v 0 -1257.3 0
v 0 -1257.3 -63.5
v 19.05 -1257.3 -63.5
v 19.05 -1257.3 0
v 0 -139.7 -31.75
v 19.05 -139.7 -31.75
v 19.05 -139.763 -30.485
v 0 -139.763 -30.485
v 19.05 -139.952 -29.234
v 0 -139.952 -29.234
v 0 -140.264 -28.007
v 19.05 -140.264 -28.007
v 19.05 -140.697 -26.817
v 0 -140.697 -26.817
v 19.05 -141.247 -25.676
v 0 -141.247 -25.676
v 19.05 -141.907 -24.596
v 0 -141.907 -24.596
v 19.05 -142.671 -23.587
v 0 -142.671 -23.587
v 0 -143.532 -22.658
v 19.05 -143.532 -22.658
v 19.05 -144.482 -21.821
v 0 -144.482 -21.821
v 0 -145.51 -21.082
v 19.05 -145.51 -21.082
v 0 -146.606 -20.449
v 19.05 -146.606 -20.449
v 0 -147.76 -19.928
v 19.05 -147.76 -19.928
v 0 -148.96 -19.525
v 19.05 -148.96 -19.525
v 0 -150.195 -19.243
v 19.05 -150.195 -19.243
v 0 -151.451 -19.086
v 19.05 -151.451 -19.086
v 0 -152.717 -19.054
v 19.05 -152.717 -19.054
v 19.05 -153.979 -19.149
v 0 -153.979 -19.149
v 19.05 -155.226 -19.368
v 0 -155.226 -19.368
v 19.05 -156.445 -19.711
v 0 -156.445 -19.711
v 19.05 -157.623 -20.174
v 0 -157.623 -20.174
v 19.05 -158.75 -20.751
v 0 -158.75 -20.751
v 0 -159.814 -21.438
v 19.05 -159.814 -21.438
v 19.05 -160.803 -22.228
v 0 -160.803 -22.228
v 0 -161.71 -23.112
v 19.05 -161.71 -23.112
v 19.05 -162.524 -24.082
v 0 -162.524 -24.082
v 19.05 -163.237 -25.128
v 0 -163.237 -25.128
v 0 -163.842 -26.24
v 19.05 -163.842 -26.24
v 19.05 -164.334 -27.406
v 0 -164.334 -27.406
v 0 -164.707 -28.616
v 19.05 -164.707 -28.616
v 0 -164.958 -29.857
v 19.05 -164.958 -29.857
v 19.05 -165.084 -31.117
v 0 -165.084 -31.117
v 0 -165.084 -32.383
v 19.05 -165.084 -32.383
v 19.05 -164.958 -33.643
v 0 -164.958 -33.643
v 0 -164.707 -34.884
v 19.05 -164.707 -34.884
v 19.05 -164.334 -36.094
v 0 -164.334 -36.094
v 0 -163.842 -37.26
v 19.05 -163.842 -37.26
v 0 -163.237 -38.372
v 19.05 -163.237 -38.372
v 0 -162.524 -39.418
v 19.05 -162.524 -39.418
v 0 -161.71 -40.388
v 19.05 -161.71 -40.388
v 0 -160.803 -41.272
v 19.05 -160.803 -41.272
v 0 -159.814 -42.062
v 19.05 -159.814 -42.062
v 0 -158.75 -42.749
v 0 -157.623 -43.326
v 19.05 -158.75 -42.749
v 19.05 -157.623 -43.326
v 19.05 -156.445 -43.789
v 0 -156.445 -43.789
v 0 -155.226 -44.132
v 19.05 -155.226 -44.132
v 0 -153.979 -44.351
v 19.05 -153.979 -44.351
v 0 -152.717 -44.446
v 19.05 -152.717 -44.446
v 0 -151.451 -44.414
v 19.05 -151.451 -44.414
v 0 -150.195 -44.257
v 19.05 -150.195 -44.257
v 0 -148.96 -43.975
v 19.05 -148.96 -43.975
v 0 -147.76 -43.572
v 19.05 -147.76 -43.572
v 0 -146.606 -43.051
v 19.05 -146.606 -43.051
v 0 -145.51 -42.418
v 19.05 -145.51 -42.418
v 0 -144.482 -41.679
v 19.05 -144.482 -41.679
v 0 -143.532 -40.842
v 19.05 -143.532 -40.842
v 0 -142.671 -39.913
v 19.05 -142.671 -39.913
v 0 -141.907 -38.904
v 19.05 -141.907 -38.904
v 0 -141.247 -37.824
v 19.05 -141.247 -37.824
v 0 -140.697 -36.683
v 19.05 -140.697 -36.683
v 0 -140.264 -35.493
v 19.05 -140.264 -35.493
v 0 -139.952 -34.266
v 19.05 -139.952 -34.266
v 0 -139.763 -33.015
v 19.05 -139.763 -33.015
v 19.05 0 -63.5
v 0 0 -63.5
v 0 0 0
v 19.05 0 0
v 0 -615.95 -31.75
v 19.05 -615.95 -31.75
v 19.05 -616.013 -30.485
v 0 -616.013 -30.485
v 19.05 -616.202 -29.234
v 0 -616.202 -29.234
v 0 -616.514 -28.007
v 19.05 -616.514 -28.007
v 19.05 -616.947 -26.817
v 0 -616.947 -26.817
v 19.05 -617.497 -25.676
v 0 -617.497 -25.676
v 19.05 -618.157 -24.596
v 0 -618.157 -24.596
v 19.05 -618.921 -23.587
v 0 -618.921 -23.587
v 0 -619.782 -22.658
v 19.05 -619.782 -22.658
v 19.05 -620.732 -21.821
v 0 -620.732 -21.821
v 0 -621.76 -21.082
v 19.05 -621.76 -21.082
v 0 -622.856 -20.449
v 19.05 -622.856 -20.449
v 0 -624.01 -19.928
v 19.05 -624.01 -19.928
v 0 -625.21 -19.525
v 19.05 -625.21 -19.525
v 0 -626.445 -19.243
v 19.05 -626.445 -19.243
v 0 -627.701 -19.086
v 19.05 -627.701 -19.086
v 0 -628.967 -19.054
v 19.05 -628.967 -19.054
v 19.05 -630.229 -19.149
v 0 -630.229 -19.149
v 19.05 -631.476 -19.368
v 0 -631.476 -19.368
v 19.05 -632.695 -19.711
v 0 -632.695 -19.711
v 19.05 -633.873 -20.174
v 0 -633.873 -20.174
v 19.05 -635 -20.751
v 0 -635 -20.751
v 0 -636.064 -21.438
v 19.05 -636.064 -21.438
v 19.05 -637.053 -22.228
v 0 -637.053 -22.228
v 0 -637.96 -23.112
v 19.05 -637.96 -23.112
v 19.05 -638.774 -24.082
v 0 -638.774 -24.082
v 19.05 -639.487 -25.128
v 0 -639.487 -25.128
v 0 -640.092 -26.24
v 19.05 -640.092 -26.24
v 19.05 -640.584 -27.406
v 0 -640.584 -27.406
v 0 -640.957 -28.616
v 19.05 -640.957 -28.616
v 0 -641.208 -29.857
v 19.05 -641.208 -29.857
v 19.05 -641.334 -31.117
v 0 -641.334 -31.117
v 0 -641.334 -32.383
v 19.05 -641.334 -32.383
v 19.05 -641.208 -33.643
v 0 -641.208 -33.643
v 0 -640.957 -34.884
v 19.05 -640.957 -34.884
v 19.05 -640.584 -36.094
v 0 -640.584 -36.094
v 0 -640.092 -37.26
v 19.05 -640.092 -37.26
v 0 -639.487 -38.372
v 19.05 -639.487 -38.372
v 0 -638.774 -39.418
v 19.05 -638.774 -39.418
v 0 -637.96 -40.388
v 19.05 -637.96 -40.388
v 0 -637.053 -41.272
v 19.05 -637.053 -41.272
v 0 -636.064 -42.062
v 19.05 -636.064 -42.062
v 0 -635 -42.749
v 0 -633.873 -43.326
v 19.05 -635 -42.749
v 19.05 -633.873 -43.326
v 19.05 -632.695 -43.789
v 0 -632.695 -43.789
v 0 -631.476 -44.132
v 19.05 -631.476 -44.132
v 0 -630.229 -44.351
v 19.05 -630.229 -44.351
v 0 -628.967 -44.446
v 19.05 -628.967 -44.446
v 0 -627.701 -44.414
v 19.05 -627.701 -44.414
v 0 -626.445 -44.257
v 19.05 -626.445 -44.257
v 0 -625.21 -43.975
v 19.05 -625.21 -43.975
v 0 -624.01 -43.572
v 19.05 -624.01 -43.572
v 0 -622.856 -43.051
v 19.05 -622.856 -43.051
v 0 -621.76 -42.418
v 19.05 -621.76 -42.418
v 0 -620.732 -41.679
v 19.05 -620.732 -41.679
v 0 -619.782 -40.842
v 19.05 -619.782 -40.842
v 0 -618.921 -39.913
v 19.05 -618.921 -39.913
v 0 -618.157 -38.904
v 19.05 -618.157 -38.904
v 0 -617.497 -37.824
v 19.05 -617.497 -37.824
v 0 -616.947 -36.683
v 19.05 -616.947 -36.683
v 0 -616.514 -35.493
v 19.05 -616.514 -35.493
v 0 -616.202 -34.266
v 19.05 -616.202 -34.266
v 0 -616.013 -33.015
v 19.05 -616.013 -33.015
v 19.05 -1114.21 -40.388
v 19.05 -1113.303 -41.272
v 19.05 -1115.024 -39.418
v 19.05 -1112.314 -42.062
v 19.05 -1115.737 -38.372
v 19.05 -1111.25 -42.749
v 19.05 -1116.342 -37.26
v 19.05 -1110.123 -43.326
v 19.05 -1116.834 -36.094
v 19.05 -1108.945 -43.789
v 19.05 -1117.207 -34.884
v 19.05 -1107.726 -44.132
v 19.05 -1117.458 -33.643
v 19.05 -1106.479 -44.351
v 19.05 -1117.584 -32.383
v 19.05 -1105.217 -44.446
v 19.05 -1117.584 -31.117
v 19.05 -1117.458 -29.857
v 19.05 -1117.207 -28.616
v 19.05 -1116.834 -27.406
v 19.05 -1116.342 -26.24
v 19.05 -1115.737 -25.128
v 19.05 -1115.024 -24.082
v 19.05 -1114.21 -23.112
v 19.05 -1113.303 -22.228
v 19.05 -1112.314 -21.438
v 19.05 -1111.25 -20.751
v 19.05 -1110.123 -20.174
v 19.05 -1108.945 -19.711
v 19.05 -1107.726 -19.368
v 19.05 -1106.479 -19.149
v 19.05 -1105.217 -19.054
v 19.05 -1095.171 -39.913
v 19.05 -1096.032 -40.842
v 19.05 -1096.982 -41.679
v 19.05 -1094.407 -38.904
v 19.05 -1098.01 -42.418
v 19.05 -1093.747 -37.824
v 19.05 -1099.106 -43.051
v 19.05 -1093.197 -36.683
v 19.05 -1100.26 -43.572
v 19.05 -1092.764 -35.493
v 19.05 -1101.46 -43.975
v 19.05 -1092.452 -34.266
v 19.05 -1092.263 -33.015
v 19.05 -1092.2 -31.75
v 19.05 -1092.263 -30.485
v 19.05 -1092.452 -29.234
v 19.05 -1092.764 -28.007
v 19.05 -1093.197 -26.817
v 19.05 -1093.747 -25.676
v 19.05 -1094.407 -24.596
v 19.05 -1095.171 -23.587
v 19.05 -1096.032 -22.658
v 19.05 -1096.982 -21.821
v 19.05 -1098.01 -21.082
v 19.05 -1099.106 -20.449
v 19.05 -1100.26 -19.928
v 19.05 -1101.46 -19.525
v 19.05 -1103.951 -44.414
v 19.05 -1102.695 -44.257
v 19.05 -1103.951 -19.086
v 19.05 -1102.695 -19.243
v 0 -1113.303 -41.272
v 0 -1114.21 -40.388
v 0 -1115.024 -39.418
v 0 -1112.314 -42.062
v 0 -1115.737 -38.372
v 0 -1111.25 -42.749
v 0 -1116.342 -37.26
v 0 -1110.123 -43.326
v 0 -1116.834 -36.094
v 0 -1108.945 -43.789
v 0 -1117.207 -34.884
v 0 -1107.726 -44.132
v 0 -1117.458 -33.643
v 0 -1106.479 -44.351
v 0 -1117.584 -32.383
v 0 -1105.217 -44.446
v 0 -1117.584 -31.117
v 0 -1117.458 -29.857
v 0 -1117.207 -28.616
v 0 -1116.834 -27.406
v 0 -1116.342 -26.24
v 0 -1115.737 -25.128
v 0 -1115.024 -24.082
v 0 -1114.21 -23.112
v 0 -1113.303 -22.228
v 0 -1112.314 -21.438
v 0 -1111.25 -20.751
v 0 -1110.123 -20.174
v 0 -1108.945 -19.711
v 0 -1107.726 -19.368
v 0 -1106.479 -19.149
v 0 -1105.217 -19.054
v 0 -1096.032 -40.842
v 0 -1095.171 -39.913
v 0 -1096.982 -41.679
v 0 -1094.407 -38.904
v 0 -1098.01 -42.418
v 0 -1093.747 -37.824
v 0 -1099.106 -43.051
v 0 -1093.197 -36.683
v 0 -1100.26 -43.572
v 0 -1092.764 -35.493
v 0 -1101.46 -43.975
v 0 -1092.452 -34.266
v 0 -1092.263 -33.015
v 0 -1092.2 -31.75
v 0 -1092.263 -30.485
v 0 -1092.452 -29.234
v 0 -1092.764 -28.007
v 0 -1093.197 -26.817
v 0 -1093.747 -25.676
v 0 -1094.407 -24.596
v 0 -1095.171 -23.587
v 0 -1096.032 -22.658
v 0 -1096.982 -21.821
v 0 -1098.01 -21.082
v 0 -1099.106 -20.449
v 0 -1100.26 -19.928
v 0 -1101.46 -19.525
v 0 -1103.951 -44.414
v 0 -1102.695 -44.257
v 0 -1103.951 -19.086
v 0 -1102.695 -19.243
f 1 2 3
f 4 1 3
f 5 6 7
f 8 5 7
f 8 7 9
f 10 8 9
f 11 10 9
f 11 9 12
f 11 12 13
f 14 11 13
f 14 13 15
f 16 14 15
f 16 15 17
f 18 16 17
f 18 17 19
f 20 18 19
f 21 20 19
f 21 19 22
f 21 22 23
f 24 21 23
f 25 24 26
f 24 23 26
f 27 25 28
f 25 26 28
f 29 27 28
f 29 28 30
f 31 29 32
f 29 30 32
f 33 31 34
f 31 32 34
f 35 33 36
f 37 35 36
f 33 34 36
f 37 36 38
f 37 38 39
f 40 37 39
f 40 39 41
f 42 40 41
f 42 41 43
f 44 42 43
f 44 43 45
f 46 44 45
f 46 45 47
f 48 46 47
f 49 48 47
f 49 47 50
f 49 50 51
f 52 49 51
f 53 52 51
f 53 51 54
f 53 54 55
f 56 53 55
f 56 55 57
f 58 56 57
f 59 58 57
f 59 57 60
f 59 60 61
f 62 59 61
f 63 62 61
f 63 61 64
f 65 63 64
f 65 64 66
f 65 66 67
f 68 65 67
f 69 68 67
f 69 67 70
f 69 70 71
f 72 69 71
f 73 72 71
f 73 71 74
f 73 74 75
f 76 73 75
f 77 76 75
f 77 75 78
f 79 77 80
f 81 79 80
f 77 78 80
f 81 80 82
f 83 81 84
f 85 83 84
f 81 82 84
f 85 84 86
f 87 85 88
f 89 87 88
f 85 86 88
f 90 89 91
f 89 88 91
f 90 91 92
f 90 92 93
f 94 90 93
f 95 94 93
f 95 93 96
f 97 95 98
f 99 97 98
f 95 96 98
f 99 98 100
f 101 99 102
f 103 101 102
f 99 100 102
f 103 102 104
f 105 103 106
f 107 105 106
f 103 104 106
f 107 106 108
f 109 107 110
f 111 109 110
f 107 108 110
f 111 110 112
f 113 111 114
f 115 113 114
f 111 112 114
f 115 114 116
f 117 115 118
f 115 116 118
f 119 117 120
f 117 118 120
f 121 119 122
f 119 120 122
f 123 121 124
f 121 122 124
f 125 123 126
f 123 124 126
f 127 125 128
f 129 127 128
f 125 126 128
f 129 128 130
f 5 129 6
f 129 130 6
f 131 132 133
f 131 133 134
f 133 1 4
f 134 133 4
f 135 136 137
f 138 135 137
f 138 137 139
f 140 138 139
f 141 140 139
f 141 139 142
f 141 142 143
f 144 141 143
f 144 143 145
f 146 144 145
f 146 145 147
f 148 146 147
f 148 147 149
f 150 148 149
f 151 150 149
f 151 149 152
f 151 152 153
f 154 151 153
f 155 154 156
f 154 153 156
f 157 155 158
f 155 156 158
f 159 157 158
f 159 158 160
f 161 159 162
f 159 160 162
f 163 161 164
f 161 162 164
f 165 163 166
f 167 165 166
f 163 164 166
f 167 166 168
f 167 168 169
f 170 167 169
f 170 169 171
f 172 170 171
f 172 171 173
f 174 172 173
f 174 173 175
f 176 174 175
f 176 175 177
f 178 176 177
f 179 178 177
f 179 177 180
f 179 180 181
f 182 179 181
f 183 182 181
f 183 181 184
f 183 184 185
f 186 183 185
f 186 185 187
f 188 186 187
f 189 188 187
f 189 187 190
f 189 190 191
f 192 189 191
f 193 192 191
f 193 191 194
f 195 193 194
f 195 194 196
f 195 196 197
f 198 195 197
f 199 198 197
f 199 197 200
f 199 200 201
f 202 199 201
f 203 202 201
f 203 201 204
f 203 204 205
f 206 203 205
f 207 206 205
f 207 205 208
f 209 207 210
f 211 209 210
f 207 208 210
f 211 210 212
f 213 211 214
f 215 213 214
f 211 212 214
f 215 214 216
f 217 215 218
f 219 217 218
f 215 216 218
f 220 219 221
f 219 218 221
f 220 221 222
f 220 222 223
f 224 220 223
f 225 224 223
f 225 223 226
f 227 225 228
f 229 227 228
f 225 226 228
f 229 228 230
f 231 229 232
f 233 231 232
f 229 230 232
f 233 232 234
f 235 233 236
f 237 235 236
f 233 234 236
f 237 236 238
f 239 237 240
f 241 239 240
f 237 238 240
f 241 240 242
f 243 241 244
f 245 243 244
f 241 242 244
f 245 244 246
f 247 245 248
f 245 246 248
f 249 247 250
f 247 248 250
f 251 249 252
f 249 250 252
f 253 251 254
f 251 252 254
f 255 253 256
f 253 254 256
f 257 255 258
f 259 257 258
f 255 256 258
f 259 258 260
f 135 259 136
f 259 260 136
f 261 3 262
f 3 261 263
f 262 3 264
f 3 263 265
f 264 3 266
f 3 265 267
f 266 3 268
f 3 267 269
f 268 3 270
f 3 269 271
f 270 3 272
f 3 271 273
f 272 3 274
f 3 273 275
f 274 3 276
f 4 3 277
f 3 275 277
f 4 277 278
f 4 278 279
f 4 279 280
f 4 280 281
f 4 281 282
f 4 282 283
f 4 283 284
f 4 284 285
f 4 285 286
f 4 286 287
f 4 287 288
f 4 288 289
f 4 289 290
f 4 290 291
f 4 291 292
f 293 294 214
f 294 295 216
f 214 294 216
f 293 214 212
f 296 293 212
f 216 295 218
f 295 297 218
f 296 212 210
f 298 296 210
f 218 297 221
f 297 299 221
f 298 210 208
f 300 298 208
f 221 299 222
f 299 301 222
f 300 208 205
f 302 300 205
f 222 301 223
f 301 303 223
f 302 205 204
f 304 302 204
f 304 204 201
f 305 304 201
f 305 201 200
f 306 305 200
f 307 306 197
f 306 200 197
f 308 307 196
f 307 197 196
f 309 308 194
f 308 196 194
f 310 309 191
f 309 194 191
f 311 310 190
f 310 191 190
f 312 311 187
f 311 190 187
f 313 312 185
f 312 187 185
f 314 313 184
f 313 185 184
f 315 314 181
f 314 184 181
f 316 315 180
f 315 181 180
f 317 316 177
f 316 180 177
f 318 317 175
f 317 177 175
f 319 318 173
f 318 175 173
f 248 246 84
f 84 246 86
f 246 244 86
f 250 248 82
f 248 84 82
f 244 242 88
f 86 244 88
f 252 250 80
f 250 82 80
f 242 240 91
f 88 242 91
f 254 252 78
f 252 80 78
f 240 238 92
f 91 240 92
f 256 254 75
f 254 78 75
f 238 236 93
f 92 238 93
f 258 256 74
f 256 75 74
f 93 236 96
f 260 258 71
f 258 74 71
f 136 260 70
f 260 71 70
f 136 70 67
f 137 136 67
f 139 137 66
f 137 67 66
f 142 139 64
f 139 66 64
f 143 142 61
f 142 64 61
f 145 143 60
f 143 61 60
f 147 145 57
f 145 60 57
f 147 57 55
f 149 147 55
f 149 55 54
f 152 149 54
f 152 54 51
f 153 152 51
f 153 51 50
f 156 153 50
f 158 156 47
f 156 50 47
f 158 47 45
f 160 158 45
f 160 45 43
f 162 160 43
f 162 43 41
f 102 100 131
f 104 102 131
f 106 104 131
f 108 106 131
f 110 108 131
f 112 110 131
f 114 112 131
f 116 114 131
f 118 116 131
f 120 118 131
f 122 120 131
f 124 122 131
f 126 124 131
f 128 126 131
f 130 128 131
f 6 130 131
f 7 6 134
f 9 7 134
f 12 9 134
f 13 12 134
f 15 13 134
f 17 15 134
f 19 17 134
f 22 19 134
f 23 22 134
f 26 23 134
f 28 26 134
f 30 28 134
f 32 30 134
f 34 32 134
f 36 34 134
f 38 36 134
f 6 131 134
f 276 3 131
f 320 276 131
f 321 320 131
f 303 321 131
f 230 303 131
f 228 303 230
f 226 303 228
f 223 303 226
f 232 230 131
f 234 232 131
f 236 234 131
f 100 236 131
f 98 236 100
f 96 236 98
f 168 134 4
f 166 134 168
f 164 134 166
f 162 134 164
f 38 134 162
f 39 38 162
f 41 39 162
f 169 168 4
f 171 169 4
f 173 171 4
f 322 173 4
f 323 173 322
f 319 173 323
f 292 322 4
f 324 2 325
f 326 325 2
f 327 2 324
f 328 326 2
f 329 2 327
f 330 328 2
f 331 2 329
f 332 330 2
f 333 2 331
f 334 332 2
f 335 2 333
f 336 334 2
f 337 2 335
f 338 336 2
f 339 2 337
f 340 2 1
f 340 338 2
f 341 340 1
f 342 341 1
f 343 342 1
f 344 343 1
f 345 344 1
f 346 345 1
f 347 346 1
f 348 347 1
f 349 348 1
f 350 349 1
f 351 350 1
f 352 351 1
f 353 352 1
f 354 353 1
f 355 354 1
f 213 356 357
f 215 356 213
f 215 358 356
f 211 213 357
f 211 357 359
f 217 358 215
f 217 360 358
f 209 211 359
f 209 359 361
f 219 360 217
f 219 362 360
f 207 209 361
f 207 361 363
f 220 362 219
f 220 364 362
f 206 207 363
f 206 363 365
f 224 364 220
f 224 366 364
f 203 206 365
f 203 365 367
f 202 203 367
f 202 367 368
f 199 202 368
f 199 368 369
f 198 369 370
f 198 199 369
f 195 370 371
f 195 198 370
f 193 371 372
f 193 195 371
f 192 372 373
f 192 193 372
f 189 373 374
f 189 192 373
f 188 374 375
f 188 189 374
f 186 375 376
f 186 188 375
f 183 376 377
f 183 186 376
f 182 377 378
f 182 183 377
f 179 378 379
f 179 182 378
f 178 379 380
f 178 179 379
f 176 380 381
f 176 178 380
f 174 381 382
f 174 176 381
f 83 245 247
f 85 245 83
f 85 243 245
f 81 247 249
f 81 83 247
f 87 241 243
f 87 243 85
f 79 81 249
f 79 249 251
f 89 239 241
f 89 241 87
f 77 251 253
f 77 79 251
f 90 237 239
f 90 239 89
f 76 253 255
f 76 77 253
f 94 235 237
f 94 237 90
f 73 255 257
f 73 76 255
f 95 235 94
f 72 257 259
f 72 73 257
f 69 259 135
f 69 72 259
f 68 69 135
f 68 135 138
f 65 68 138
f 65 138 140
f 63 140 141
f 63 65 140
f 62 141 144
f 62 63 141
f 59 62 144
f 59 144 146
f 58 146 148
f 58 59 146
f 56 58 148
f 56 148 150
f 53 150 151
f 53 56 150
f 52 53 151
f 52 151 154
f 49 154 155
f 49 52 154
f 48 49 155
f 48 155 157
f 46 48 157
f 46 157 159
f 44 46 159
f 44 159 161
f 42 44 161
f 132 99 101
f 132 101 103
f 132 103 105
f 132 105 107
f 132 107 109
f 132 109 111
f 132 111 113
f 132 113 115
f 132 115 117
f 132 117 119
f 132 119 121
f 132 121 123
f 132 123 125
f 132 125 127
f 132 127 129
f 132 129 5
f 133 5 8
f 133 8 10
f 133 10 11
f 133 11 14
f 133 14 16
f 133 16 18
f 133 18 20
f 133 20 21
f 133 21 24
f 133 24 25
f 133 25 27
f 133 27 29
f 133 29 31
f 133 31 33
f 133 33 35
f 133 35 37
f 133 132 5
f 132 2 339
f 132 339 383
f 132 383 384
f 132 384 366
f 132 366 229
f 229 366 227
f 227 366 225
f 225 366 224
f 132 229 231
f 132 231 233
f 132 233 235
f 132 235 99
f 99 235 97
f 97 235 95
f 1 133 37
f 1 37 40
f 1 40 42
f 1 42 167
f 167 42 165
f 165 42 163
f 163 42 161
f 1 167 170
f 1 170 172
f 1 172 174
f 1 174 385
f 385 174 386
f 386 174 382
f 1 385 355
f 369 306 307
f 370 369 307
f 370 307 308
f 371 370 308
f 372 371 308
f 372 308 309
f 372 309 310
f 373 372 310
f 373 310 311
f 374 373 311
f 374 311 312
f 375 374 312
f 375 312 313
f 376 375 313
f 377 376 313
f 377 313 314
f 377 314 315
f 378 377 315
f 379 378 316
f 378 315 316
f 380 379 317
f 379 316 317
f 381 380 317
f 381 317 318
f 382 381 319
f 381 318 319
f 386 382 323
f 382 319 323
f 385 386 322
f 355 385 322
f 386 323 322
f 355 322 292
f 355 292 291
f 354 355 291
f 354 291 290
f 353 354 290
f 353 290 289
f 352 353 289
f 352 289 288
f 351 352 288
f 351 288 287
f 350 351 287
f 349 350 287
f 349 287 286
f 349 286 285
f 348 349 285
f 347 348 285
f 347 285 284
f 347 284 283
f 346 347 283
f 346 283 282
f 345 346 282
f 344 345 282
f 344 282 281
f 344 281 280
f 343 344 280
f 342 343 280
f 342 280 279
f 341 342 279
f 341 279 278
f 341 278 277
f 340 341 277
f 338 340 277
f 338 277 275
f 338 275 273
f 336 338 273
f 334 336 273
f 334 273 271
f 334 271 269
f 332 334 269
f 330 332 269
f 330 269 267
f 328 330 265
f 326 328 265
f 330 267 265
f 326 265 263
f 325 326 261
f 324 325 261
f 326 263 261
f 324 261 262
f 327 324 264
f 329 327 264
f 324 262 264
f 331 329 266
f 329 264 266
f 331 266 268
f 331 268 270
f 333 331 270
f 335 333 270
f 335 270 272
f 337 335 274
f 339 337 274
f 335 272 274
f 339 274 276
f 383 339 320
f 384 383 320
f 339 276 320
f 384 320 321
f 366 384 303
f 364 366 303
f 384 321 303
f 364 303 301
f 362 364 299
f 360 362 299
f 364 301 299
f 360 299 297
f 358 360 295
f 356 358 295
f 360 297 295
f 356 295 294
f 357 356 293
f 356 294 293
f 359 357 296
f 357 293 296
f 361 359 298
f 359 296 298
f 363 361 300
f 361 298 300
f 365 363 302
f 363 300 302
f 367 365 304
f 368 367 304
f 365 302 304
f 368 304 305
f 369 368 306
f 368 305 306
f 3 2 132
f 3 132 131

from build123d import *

# Parameters (mm, degrees)
F0_W     = 19.05
F0_H     = 63.5
F1_DEPTH = 1257.3
F2_R     = 12.7
F3_DEPTH = 19.051


with BuildPart() as f1:
    # F0 (on Front) → F1 (new body)
    with BuildSketch(Plane.XZ):
        with Locations((9.525, -31.75)):
            Rectangle(F0_W, F0_H)
    extrude(amount=F1_DEPTH)

    # F2 (on face) → F3 (cut, through all)
    with BuildSketch(Plane.YZ.offset(19.05)):
        with Locations((-1104.9, -31.75)):
            Circle(F2_R)
        with Locations((-628.65, -31.75)):
            Circle(F2_R)
        with Locations((-152.4, -31.75)):
            Circle(F2_R)
    extrude(amount=-F3_DEPTH, mode=Mode.SUBTRACT)


solid = f1.part
